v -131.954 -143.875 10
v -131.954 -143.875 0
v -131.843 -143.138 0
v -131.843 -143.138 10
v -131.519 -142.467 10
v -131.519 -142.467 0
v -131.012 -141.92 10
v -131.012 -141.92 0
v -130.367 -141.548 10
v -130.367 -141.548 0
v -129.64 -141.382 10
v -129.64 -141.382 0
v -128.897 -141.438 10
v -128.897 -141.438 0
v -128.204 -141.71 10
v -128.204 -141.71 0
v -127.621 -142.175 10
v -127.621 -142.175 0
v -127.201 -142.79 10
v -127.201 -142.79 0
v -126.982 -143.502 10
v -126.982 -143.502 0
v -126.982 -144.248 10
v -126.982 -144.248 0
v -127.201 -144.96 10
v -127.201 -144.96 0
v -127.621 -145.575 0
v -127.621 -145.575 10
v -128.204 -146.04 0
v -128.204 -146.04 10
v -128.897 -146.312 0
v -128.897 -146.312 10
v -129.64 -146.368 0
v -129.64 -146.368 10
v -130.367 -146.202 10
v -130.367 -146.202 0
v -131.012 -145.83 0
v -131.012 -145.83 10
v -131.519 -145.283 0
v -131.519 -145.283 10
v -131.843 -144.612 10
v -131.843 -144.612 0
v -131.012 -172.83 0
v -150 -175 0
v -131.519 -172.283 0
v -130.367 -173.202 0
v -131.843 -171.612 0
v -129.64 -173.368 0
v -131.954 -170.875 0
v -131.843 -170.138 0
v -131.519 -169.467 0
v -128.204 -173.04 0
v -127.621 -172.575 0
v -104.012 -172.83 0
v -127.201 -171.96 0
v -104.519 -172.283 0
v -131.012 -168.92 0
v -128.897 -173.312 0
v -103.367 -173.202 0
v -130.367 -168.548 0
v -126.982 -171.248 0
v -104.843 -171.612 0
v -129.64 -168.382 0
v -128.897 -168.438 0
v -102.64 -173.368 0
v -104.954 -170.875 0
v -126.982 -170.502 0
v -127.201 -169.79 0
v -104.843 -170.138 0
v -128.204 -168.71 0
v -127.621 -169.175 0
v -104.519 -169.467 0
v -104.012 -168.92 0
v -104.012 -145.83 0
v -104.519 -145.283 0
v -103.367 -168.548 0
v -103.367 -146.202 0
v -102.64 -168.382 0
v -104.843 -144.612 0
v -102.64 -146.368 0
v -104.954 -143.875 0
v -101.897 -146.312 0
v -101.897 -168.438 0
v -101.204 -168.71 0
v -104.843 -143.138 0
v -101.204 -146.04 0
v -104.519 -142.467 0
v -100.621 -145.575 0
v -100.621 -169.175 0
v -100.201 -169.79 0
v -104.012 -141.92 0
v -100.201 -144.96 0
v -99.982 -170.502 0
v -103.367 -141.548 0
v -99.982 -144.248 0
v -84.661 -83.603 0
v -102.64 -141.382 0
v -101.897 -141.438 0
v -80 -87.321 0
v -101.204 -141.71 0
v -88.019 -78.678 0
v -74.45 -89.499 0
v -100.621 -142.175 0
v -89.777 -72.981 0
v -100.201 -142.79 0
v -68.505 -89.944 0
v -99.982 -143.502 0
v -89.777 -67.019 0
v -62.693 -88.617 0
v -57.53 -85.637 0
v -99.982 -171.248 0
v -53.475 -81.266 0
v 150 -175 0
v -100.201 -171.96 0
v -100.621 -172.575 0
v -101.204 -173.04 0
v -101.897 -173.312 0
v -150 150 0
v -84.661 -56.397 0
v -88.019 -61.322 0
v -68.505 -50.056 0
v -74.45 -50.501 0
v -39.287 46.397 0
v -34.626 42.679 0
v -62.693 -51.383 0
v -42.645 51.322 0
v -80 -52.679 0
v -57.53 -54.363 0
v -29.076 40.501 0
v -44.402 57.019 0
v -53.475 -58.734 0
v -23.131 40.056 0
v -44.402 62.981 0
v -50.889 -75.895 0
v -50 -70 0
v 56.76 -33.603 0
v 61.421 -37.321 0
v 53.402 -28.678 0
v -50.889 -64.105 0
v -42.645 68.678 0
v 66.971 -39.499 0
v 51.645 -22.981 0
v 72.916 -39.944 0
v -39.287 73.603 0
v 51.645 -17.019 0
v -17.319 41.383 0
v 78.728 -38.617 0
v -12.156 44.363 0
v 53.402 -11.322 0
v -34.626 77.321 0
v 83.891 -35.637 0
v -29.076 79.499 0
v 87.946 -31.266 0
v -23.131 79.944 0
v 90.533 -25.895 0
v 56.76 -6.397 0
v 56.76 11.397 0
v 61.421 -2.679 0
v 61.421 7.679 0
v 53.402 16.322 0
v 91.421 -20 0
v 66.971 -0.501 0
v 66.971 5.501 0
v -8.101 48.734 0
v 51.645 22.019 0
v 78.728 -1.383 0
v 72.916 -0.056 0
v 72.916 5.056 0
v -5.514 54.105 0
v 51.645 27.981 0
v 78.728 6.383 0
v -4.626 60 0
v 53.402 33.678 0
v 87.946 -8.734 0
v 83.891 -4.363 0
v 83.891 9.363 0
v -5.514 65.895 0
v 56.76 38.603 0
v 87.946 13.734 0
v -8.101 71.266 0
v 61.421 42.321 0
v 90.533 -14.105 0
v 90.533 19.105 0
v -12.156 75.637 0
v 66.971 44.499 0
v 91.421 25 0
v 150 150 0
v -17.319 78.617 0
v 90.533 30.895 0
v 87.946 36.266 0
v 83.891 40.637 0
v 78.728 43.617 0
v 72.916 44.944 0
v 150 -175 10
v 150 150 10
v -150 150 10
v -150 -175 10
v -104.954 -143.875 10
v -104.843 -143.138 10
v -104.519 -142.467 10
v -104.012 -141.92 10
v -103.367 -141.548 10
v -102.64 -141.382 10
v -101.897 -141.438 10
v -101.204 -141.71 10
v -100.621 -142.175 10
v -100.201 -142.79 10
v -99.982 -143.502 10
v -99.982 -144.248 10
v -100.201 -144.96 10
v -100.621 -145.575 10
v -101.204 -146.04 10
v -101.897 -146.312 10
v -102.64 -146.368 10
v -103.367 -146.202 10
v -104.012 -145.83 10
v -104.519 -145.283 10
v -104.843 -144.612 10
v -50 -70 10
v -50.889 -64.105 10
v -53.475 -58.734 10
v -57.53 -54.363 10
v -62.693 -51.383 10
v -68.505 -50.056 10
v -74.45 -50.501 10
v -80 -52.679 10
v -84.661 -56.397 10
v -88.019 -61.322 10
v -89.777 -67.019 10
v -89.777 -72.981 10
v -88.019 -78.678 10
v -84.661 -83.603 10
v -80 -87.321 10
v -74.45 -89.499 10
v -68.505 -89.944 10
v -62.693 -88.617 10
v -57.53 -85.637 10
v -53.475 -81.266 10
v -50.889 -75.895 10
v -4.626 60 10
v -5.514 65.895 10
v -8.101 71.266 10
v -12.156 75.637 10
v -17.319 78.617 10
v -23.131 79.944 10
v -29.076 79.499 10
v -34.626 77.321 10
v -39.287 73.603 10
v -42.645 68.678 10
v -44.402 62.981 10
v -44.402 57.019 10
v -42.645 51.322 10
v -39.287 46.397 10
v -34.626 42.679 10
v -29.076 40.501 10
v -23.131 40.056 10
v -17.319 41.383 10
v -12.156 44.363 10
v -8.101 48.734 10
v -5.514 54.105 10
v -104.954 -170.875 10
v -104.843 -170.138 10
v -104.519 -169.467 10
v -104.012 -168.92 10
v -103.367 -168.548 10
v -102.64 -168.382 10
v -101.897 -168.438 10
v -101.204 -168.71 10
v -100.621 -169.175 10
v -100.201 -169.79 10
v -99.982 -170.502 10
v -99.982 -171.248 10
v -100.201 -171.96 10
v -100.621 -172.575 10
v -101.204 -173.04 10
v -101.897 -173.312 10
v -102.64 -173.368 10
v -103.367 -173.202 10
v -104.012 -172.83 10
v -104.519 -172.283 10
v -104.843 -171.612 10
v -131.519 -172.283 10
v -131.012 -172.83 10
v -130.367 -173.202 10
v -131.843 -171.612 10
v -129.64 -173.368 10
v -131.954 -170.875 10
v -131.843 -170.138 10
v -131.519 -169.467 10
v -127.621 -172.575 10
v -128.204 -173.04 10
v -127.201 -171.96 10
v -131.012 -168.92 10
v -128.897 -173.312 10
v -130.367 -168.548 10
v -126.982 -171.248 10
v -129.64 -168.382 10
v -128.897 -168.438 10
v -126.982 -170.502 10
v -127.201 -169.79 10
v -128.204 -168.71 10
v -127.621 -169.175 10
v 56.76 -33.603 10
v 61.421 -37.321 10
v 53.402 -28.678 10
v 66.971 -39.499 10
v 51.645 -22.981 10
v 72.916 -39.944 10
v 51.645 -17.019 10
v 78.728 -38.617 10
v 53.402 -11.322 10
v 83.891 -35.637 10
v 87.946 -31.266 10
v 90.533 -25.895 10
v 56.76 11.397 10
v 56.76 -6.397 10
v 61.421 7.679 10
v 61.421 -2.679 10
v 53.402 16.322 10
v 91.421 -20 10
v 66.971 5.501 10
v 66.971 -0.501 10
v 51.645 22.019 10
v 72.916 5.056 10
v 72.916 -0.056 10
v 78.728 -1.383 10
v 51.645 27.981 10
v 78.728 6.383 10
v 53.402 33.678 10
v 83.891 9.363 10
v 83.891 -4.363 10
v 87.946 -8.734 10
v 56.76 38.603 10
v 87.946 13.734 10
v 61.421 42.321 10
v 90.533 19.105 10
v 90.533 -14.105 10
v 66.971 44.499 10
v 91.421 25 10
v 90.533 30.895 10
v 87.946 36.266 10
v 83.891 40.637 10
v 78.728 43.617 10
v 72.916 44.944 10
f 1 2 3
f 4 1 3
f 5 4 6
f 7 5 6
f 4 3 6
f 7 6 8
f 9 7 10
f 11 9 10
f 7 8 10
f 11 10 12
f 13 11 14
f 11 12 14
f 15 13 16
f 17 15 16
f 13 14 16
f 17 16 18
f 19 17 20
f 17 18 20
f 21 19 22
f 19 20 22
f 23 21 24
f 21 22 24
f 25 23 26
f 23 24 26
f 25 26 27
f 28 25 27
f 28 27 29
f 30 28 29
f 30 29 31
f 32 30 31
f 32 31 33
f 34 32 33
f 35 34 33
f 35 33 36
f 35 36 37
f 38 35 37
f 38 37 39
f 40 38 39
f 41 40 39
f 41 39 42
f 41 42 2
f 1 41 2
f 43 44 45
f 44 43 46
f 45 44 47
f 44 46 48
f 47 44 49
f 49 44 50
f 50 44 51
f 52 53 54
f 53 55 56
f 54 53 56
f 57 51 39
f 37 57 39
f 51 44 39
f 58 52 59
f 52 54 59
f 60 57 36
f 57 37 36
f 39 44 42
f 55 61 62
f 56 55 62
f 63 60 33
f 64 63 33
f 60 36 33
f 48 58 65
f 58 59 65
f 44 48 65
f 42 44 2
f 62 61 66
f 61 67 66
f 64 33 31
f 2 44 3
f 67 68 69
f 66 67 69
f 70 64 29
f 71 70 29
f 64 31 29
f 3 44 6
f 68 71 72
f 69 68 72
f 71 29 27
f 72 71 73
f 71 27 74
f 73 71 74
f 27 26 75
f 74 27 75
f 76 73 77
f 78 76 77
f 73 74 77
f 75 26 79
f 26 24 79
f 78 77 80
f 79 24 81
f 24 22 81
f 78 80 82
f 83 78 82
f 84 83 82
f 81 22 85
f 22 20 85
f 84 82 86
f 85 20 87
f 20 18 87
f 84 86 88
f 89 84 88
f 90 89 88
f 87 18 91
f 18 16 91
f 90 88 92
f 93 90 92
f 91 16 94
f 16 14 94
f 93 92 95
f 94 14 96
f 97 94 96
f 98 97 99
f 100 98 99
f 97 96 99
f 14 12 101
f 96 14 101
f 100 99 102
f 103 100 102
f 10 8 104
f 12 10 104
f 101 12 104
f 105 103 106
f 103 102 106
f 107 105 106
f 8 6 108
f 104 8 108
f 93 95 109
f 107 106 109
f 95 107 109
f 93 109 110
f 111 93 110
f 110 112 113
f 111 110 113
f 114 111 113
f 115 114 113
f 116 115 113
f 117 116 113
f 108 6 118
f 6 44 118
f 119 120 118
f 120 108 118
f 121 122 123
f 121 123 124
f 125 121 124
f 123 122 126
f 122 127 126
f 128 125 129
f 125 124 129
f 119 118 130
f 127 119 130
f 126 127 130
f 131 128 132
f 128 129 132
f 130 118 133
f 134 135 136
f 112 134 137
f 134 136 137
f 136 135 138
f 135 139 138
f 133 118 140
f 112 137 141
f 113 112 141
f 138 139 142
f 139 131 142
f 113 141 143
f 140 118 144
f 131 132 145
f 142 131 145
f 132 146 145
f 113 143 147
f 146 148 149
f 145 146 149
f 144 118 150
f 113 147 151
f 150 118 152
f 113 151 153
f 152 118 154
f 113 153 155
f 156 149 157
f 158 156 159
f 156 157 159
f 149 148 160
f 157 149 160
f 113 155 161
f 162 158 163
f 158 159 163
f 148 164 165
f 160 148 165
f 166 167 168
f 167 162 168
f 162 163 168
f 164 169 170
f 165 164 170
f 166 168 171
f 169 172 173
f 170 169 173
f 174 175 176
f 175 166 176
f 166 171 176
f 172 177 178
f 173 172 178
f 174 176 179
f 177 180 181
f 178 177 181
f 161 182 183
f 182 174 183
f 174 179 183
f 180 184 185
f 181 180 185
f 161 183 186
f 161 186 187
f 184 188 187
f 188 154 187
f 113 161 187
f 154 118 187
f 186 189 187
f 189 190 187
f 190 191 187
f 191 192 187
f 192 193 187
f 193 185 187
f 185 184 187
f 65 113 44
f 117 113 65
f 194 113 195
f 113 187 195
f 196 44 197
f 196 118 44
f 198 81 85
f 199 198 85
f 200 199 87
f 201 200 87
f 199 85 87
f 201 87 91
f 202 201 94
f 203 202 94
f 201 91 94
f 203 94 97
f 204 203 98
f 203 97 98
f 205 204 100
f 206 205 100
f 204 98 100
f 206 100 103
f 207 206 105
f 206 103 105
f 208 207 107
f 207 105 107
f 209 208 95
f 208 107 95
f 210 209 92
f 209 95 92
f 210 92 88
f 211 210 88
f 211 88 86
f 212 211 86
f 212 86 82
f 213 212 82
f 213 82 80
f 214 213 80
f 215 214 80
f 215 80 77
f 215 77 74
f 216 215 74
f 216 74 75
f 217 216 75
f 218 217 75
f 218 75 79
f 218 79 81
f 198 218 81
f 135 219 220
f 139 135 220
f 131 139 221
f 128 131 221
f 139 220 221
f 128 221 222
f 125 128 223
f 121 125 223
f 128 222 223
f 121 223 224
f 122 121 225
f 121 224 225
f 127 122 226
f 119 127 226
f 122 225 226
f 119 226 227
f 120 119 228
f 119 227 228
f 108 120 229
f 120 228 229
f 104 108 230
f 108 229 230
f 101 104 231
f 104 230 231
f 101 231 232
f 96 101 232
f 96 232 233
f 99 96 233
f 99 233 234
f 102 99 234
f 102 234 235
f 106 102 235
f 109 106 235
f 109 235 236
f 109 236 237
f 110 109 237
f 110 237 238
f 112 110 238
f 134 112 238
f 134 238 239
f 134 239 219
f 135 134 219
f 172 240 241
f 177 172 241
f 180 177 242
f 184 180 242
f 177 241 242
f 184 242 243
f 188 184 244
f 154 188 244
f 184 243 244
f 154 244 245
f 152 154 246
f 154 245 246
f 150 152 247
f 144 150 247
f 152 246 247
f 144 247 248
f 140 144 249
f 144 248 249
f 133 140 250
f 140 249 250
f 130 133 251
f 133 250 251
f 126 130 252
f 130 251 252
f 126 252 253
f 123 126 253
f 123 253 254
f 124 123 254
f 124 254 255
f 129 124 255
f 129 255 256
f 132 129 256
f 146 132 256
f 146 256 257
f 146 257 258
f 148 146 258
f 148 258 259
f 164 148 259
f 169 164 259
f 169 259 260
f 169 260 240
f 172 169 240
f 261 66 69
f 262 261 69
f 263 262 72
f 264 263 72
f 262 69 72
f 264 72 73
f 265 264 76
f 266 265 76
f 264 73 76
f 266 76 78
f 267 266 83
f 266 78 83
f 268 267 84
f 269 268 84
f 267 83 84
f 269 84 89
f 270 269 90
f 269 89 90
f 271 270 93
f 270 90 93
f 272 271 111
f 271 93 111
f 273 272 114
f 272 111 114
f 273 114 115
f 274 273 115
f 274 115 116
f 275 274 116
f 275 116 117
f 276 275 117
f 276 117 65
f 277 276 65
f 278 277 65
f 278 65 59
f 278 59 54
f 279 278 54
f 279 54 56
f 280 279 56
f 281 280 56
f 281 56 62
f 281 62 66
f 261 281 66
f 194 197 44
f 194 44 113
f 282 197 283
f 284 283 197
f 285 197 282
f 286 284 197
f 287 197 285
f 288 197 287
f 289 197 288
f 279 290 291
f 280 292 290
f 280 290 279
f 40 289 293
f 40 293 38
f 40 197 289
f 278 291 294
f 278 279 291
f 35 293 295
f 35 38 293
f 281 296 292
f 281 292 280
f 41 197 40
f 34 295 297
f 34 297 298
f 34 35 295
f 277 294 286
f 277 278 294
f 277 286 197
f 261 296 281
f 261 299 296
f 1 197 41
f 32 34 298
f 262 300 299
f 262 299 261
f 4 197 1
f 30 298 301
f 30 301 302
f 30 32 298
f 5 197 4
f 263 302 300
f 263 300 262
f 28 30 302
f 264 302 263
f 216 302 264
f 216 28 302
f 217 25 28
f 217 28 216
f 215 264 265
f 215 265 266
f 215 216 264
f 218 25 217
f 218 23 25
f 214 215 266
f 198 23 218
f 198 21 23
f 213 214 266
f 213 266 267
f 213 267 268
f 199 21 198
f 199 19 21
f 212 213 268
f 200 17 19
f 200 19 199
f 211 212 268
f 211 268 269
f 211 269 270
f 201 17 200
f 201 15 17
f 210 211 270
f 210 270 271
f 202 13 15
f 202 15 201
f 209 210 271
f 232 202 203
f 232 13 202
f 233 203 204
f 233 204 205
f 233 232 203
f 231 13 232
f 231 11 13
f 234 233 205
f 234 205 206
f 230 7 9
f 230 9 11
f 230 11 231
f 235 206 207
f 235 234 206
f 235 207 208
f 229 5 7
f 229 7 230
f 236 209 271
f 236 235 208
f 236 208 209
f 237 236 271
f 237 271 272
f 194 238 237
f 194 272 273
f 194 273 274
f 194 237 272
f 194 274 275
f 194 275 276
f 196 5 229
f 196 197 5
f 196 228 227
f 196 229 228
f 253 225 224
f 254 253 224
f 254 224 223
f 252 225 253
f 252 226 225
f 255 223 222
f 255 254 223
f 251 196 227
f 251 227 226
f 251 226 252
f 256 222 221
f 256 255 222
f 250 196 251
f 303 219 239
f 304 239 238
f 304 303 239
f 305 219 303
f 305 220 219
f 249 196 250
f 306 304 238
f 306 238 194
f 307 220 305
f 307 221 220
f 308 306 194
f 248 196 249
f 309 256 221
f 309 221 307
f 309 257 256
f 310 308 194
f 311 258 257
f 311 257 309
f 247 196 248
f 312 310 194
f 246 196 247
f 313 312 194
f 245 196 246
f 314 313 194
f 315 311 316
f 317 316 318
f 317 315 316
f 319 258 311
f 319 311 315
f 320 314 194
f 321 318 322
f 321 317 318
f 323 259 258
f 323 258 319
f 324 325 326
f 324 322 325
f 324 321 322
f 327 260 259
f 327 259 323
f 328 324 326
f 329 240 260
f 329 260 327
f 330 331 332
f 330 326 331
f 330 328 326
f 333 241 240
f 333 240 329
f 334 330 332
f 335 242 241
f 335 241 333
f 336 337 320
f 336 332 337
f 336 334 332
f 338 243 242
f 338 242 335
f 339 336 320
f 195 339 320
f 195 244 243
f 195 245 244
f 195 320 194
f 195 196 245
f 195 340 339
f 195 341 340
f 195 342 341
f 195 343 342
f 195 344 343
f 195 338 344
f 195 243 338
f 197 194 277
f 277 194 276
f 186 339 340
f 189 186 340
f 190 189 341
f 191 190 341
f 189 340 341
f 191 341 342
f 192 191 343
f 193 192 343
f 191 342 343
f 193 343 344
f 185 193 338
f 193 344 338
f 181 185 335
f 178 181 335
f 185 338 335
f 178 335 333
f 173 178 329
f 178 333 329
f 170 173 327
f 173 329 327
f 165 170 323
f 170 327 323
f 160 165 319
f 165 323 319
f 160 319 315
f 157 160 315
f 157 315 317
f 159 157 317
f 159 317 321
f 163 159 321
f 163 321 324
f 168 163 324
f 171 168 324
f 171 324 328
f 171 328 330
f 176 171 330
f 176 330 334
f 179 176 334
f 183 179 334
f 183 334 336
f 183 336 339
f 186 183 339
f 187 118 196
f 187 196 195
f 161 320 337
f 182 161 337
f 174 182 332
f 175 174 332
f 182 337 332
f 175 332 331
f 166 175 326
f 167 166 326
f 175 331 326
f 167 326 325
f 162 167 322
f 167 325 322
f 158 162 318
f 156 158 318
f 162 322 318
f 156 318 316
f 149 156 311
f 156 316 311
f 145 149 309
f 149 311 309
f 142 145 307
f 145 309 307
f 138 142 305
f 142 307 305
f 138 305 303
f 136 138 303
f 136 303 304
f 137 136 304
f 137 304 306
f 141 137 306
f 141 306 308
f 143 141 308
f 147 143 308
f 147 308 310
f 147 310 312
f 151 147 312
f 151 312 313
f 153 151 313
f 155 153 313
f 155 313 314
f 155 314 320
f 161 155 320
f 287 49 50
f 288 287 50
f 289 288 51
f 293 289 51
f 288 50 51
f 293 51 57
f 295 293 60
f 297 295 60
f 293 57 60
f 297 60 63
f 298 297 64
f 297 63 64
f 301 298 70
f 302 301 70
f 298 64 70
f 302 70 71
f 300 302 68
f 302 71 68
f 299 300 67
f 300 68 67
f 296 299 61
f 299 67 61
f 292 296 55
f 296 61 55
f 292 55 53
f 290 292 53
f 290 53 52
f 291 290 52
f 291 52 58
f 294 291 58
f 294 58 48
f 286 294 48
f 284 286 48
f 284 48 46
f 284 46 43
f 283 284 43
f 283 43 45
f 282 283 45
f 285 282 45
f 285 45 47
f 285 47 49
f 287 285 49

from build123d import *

# Parameters (mm, degrees)
SKETCH_1_W          = 300
SKETCH_1_H          = 300
EXTRUDE_1_DEPTH     = 10
SKETCH_2_R          = 20
CUT_EXTRUDE_1_DEPTH = 213.367605816
SKETCH_5_W          = 300
SKETCH_5_H          = 10
EXTRUDE_2_DEPTH     = 25
SKETCH_7_R          = 2.5
CUT_EXTRUDE_5_DEPTH = 231.705439901


with BuildPart() as part:
    # 草图1 → 凸台-拉伸1 (new body)
    with BuildSketch(Plane.XY):
        Rectangle(SKETCH_1_W, SKETCH_1_H)
    extrude(amount=EXTRUDE_1_DEPTH)

    # 草图2 → 切除-拉伸1 (cut, through all)
    with BuildSketch(Plane.XY.offset(10)):
        with Locations((-70, -70)):
            Circle(SKETCH_2_R)
        with Locations((71.421356237, -20)):
            Circle(SKETCH_2_R)
        with Locations((-24.625507324, 60)):
            Circle(SKETCH_2_R)
        with Locations((71.421356237, 25)):
            Circle(SKETCH_2_R)
    extrude(amount=-CUT_EXTRUDE_1_DEPTH, mode=Mode.SUBTRACT)

    # 草图5 → 凸台-拉伸2 (add)
    with BuildSketch(Plane.XZ.offset(150)):
        with Locations((0, 5)):
            Rectangle(SKETCH_5_W, SKETCH_5_H)
    extrude(amount=EXTRUDE_2_DEPTH)

    # 草图7 → 切除-拉伸5 (cut, through all)
    with BuildSketch(Plane(origin=(0, 0, 0), x_dir=(-1, 0, 0), z_dir=(0, 0, -1))):
        with Locations((129.453643763, -143.875)):
            Circle(SKETCH_7_R)
        with Locations((102.453643763, -143.875)):
            Circle(SKETCH_7_R)
        with Locations((129.453643763, -170.875)):
            Circle(SKETCH_7_R)
        with Locations((102.453643763, -170.875)):
            Circle(SKETCH_7_R)
    extrude(amount=-CUT_EXTRUDE_5_DEPTH, mode=Mode.SUBTRACT)


solid = part.part
